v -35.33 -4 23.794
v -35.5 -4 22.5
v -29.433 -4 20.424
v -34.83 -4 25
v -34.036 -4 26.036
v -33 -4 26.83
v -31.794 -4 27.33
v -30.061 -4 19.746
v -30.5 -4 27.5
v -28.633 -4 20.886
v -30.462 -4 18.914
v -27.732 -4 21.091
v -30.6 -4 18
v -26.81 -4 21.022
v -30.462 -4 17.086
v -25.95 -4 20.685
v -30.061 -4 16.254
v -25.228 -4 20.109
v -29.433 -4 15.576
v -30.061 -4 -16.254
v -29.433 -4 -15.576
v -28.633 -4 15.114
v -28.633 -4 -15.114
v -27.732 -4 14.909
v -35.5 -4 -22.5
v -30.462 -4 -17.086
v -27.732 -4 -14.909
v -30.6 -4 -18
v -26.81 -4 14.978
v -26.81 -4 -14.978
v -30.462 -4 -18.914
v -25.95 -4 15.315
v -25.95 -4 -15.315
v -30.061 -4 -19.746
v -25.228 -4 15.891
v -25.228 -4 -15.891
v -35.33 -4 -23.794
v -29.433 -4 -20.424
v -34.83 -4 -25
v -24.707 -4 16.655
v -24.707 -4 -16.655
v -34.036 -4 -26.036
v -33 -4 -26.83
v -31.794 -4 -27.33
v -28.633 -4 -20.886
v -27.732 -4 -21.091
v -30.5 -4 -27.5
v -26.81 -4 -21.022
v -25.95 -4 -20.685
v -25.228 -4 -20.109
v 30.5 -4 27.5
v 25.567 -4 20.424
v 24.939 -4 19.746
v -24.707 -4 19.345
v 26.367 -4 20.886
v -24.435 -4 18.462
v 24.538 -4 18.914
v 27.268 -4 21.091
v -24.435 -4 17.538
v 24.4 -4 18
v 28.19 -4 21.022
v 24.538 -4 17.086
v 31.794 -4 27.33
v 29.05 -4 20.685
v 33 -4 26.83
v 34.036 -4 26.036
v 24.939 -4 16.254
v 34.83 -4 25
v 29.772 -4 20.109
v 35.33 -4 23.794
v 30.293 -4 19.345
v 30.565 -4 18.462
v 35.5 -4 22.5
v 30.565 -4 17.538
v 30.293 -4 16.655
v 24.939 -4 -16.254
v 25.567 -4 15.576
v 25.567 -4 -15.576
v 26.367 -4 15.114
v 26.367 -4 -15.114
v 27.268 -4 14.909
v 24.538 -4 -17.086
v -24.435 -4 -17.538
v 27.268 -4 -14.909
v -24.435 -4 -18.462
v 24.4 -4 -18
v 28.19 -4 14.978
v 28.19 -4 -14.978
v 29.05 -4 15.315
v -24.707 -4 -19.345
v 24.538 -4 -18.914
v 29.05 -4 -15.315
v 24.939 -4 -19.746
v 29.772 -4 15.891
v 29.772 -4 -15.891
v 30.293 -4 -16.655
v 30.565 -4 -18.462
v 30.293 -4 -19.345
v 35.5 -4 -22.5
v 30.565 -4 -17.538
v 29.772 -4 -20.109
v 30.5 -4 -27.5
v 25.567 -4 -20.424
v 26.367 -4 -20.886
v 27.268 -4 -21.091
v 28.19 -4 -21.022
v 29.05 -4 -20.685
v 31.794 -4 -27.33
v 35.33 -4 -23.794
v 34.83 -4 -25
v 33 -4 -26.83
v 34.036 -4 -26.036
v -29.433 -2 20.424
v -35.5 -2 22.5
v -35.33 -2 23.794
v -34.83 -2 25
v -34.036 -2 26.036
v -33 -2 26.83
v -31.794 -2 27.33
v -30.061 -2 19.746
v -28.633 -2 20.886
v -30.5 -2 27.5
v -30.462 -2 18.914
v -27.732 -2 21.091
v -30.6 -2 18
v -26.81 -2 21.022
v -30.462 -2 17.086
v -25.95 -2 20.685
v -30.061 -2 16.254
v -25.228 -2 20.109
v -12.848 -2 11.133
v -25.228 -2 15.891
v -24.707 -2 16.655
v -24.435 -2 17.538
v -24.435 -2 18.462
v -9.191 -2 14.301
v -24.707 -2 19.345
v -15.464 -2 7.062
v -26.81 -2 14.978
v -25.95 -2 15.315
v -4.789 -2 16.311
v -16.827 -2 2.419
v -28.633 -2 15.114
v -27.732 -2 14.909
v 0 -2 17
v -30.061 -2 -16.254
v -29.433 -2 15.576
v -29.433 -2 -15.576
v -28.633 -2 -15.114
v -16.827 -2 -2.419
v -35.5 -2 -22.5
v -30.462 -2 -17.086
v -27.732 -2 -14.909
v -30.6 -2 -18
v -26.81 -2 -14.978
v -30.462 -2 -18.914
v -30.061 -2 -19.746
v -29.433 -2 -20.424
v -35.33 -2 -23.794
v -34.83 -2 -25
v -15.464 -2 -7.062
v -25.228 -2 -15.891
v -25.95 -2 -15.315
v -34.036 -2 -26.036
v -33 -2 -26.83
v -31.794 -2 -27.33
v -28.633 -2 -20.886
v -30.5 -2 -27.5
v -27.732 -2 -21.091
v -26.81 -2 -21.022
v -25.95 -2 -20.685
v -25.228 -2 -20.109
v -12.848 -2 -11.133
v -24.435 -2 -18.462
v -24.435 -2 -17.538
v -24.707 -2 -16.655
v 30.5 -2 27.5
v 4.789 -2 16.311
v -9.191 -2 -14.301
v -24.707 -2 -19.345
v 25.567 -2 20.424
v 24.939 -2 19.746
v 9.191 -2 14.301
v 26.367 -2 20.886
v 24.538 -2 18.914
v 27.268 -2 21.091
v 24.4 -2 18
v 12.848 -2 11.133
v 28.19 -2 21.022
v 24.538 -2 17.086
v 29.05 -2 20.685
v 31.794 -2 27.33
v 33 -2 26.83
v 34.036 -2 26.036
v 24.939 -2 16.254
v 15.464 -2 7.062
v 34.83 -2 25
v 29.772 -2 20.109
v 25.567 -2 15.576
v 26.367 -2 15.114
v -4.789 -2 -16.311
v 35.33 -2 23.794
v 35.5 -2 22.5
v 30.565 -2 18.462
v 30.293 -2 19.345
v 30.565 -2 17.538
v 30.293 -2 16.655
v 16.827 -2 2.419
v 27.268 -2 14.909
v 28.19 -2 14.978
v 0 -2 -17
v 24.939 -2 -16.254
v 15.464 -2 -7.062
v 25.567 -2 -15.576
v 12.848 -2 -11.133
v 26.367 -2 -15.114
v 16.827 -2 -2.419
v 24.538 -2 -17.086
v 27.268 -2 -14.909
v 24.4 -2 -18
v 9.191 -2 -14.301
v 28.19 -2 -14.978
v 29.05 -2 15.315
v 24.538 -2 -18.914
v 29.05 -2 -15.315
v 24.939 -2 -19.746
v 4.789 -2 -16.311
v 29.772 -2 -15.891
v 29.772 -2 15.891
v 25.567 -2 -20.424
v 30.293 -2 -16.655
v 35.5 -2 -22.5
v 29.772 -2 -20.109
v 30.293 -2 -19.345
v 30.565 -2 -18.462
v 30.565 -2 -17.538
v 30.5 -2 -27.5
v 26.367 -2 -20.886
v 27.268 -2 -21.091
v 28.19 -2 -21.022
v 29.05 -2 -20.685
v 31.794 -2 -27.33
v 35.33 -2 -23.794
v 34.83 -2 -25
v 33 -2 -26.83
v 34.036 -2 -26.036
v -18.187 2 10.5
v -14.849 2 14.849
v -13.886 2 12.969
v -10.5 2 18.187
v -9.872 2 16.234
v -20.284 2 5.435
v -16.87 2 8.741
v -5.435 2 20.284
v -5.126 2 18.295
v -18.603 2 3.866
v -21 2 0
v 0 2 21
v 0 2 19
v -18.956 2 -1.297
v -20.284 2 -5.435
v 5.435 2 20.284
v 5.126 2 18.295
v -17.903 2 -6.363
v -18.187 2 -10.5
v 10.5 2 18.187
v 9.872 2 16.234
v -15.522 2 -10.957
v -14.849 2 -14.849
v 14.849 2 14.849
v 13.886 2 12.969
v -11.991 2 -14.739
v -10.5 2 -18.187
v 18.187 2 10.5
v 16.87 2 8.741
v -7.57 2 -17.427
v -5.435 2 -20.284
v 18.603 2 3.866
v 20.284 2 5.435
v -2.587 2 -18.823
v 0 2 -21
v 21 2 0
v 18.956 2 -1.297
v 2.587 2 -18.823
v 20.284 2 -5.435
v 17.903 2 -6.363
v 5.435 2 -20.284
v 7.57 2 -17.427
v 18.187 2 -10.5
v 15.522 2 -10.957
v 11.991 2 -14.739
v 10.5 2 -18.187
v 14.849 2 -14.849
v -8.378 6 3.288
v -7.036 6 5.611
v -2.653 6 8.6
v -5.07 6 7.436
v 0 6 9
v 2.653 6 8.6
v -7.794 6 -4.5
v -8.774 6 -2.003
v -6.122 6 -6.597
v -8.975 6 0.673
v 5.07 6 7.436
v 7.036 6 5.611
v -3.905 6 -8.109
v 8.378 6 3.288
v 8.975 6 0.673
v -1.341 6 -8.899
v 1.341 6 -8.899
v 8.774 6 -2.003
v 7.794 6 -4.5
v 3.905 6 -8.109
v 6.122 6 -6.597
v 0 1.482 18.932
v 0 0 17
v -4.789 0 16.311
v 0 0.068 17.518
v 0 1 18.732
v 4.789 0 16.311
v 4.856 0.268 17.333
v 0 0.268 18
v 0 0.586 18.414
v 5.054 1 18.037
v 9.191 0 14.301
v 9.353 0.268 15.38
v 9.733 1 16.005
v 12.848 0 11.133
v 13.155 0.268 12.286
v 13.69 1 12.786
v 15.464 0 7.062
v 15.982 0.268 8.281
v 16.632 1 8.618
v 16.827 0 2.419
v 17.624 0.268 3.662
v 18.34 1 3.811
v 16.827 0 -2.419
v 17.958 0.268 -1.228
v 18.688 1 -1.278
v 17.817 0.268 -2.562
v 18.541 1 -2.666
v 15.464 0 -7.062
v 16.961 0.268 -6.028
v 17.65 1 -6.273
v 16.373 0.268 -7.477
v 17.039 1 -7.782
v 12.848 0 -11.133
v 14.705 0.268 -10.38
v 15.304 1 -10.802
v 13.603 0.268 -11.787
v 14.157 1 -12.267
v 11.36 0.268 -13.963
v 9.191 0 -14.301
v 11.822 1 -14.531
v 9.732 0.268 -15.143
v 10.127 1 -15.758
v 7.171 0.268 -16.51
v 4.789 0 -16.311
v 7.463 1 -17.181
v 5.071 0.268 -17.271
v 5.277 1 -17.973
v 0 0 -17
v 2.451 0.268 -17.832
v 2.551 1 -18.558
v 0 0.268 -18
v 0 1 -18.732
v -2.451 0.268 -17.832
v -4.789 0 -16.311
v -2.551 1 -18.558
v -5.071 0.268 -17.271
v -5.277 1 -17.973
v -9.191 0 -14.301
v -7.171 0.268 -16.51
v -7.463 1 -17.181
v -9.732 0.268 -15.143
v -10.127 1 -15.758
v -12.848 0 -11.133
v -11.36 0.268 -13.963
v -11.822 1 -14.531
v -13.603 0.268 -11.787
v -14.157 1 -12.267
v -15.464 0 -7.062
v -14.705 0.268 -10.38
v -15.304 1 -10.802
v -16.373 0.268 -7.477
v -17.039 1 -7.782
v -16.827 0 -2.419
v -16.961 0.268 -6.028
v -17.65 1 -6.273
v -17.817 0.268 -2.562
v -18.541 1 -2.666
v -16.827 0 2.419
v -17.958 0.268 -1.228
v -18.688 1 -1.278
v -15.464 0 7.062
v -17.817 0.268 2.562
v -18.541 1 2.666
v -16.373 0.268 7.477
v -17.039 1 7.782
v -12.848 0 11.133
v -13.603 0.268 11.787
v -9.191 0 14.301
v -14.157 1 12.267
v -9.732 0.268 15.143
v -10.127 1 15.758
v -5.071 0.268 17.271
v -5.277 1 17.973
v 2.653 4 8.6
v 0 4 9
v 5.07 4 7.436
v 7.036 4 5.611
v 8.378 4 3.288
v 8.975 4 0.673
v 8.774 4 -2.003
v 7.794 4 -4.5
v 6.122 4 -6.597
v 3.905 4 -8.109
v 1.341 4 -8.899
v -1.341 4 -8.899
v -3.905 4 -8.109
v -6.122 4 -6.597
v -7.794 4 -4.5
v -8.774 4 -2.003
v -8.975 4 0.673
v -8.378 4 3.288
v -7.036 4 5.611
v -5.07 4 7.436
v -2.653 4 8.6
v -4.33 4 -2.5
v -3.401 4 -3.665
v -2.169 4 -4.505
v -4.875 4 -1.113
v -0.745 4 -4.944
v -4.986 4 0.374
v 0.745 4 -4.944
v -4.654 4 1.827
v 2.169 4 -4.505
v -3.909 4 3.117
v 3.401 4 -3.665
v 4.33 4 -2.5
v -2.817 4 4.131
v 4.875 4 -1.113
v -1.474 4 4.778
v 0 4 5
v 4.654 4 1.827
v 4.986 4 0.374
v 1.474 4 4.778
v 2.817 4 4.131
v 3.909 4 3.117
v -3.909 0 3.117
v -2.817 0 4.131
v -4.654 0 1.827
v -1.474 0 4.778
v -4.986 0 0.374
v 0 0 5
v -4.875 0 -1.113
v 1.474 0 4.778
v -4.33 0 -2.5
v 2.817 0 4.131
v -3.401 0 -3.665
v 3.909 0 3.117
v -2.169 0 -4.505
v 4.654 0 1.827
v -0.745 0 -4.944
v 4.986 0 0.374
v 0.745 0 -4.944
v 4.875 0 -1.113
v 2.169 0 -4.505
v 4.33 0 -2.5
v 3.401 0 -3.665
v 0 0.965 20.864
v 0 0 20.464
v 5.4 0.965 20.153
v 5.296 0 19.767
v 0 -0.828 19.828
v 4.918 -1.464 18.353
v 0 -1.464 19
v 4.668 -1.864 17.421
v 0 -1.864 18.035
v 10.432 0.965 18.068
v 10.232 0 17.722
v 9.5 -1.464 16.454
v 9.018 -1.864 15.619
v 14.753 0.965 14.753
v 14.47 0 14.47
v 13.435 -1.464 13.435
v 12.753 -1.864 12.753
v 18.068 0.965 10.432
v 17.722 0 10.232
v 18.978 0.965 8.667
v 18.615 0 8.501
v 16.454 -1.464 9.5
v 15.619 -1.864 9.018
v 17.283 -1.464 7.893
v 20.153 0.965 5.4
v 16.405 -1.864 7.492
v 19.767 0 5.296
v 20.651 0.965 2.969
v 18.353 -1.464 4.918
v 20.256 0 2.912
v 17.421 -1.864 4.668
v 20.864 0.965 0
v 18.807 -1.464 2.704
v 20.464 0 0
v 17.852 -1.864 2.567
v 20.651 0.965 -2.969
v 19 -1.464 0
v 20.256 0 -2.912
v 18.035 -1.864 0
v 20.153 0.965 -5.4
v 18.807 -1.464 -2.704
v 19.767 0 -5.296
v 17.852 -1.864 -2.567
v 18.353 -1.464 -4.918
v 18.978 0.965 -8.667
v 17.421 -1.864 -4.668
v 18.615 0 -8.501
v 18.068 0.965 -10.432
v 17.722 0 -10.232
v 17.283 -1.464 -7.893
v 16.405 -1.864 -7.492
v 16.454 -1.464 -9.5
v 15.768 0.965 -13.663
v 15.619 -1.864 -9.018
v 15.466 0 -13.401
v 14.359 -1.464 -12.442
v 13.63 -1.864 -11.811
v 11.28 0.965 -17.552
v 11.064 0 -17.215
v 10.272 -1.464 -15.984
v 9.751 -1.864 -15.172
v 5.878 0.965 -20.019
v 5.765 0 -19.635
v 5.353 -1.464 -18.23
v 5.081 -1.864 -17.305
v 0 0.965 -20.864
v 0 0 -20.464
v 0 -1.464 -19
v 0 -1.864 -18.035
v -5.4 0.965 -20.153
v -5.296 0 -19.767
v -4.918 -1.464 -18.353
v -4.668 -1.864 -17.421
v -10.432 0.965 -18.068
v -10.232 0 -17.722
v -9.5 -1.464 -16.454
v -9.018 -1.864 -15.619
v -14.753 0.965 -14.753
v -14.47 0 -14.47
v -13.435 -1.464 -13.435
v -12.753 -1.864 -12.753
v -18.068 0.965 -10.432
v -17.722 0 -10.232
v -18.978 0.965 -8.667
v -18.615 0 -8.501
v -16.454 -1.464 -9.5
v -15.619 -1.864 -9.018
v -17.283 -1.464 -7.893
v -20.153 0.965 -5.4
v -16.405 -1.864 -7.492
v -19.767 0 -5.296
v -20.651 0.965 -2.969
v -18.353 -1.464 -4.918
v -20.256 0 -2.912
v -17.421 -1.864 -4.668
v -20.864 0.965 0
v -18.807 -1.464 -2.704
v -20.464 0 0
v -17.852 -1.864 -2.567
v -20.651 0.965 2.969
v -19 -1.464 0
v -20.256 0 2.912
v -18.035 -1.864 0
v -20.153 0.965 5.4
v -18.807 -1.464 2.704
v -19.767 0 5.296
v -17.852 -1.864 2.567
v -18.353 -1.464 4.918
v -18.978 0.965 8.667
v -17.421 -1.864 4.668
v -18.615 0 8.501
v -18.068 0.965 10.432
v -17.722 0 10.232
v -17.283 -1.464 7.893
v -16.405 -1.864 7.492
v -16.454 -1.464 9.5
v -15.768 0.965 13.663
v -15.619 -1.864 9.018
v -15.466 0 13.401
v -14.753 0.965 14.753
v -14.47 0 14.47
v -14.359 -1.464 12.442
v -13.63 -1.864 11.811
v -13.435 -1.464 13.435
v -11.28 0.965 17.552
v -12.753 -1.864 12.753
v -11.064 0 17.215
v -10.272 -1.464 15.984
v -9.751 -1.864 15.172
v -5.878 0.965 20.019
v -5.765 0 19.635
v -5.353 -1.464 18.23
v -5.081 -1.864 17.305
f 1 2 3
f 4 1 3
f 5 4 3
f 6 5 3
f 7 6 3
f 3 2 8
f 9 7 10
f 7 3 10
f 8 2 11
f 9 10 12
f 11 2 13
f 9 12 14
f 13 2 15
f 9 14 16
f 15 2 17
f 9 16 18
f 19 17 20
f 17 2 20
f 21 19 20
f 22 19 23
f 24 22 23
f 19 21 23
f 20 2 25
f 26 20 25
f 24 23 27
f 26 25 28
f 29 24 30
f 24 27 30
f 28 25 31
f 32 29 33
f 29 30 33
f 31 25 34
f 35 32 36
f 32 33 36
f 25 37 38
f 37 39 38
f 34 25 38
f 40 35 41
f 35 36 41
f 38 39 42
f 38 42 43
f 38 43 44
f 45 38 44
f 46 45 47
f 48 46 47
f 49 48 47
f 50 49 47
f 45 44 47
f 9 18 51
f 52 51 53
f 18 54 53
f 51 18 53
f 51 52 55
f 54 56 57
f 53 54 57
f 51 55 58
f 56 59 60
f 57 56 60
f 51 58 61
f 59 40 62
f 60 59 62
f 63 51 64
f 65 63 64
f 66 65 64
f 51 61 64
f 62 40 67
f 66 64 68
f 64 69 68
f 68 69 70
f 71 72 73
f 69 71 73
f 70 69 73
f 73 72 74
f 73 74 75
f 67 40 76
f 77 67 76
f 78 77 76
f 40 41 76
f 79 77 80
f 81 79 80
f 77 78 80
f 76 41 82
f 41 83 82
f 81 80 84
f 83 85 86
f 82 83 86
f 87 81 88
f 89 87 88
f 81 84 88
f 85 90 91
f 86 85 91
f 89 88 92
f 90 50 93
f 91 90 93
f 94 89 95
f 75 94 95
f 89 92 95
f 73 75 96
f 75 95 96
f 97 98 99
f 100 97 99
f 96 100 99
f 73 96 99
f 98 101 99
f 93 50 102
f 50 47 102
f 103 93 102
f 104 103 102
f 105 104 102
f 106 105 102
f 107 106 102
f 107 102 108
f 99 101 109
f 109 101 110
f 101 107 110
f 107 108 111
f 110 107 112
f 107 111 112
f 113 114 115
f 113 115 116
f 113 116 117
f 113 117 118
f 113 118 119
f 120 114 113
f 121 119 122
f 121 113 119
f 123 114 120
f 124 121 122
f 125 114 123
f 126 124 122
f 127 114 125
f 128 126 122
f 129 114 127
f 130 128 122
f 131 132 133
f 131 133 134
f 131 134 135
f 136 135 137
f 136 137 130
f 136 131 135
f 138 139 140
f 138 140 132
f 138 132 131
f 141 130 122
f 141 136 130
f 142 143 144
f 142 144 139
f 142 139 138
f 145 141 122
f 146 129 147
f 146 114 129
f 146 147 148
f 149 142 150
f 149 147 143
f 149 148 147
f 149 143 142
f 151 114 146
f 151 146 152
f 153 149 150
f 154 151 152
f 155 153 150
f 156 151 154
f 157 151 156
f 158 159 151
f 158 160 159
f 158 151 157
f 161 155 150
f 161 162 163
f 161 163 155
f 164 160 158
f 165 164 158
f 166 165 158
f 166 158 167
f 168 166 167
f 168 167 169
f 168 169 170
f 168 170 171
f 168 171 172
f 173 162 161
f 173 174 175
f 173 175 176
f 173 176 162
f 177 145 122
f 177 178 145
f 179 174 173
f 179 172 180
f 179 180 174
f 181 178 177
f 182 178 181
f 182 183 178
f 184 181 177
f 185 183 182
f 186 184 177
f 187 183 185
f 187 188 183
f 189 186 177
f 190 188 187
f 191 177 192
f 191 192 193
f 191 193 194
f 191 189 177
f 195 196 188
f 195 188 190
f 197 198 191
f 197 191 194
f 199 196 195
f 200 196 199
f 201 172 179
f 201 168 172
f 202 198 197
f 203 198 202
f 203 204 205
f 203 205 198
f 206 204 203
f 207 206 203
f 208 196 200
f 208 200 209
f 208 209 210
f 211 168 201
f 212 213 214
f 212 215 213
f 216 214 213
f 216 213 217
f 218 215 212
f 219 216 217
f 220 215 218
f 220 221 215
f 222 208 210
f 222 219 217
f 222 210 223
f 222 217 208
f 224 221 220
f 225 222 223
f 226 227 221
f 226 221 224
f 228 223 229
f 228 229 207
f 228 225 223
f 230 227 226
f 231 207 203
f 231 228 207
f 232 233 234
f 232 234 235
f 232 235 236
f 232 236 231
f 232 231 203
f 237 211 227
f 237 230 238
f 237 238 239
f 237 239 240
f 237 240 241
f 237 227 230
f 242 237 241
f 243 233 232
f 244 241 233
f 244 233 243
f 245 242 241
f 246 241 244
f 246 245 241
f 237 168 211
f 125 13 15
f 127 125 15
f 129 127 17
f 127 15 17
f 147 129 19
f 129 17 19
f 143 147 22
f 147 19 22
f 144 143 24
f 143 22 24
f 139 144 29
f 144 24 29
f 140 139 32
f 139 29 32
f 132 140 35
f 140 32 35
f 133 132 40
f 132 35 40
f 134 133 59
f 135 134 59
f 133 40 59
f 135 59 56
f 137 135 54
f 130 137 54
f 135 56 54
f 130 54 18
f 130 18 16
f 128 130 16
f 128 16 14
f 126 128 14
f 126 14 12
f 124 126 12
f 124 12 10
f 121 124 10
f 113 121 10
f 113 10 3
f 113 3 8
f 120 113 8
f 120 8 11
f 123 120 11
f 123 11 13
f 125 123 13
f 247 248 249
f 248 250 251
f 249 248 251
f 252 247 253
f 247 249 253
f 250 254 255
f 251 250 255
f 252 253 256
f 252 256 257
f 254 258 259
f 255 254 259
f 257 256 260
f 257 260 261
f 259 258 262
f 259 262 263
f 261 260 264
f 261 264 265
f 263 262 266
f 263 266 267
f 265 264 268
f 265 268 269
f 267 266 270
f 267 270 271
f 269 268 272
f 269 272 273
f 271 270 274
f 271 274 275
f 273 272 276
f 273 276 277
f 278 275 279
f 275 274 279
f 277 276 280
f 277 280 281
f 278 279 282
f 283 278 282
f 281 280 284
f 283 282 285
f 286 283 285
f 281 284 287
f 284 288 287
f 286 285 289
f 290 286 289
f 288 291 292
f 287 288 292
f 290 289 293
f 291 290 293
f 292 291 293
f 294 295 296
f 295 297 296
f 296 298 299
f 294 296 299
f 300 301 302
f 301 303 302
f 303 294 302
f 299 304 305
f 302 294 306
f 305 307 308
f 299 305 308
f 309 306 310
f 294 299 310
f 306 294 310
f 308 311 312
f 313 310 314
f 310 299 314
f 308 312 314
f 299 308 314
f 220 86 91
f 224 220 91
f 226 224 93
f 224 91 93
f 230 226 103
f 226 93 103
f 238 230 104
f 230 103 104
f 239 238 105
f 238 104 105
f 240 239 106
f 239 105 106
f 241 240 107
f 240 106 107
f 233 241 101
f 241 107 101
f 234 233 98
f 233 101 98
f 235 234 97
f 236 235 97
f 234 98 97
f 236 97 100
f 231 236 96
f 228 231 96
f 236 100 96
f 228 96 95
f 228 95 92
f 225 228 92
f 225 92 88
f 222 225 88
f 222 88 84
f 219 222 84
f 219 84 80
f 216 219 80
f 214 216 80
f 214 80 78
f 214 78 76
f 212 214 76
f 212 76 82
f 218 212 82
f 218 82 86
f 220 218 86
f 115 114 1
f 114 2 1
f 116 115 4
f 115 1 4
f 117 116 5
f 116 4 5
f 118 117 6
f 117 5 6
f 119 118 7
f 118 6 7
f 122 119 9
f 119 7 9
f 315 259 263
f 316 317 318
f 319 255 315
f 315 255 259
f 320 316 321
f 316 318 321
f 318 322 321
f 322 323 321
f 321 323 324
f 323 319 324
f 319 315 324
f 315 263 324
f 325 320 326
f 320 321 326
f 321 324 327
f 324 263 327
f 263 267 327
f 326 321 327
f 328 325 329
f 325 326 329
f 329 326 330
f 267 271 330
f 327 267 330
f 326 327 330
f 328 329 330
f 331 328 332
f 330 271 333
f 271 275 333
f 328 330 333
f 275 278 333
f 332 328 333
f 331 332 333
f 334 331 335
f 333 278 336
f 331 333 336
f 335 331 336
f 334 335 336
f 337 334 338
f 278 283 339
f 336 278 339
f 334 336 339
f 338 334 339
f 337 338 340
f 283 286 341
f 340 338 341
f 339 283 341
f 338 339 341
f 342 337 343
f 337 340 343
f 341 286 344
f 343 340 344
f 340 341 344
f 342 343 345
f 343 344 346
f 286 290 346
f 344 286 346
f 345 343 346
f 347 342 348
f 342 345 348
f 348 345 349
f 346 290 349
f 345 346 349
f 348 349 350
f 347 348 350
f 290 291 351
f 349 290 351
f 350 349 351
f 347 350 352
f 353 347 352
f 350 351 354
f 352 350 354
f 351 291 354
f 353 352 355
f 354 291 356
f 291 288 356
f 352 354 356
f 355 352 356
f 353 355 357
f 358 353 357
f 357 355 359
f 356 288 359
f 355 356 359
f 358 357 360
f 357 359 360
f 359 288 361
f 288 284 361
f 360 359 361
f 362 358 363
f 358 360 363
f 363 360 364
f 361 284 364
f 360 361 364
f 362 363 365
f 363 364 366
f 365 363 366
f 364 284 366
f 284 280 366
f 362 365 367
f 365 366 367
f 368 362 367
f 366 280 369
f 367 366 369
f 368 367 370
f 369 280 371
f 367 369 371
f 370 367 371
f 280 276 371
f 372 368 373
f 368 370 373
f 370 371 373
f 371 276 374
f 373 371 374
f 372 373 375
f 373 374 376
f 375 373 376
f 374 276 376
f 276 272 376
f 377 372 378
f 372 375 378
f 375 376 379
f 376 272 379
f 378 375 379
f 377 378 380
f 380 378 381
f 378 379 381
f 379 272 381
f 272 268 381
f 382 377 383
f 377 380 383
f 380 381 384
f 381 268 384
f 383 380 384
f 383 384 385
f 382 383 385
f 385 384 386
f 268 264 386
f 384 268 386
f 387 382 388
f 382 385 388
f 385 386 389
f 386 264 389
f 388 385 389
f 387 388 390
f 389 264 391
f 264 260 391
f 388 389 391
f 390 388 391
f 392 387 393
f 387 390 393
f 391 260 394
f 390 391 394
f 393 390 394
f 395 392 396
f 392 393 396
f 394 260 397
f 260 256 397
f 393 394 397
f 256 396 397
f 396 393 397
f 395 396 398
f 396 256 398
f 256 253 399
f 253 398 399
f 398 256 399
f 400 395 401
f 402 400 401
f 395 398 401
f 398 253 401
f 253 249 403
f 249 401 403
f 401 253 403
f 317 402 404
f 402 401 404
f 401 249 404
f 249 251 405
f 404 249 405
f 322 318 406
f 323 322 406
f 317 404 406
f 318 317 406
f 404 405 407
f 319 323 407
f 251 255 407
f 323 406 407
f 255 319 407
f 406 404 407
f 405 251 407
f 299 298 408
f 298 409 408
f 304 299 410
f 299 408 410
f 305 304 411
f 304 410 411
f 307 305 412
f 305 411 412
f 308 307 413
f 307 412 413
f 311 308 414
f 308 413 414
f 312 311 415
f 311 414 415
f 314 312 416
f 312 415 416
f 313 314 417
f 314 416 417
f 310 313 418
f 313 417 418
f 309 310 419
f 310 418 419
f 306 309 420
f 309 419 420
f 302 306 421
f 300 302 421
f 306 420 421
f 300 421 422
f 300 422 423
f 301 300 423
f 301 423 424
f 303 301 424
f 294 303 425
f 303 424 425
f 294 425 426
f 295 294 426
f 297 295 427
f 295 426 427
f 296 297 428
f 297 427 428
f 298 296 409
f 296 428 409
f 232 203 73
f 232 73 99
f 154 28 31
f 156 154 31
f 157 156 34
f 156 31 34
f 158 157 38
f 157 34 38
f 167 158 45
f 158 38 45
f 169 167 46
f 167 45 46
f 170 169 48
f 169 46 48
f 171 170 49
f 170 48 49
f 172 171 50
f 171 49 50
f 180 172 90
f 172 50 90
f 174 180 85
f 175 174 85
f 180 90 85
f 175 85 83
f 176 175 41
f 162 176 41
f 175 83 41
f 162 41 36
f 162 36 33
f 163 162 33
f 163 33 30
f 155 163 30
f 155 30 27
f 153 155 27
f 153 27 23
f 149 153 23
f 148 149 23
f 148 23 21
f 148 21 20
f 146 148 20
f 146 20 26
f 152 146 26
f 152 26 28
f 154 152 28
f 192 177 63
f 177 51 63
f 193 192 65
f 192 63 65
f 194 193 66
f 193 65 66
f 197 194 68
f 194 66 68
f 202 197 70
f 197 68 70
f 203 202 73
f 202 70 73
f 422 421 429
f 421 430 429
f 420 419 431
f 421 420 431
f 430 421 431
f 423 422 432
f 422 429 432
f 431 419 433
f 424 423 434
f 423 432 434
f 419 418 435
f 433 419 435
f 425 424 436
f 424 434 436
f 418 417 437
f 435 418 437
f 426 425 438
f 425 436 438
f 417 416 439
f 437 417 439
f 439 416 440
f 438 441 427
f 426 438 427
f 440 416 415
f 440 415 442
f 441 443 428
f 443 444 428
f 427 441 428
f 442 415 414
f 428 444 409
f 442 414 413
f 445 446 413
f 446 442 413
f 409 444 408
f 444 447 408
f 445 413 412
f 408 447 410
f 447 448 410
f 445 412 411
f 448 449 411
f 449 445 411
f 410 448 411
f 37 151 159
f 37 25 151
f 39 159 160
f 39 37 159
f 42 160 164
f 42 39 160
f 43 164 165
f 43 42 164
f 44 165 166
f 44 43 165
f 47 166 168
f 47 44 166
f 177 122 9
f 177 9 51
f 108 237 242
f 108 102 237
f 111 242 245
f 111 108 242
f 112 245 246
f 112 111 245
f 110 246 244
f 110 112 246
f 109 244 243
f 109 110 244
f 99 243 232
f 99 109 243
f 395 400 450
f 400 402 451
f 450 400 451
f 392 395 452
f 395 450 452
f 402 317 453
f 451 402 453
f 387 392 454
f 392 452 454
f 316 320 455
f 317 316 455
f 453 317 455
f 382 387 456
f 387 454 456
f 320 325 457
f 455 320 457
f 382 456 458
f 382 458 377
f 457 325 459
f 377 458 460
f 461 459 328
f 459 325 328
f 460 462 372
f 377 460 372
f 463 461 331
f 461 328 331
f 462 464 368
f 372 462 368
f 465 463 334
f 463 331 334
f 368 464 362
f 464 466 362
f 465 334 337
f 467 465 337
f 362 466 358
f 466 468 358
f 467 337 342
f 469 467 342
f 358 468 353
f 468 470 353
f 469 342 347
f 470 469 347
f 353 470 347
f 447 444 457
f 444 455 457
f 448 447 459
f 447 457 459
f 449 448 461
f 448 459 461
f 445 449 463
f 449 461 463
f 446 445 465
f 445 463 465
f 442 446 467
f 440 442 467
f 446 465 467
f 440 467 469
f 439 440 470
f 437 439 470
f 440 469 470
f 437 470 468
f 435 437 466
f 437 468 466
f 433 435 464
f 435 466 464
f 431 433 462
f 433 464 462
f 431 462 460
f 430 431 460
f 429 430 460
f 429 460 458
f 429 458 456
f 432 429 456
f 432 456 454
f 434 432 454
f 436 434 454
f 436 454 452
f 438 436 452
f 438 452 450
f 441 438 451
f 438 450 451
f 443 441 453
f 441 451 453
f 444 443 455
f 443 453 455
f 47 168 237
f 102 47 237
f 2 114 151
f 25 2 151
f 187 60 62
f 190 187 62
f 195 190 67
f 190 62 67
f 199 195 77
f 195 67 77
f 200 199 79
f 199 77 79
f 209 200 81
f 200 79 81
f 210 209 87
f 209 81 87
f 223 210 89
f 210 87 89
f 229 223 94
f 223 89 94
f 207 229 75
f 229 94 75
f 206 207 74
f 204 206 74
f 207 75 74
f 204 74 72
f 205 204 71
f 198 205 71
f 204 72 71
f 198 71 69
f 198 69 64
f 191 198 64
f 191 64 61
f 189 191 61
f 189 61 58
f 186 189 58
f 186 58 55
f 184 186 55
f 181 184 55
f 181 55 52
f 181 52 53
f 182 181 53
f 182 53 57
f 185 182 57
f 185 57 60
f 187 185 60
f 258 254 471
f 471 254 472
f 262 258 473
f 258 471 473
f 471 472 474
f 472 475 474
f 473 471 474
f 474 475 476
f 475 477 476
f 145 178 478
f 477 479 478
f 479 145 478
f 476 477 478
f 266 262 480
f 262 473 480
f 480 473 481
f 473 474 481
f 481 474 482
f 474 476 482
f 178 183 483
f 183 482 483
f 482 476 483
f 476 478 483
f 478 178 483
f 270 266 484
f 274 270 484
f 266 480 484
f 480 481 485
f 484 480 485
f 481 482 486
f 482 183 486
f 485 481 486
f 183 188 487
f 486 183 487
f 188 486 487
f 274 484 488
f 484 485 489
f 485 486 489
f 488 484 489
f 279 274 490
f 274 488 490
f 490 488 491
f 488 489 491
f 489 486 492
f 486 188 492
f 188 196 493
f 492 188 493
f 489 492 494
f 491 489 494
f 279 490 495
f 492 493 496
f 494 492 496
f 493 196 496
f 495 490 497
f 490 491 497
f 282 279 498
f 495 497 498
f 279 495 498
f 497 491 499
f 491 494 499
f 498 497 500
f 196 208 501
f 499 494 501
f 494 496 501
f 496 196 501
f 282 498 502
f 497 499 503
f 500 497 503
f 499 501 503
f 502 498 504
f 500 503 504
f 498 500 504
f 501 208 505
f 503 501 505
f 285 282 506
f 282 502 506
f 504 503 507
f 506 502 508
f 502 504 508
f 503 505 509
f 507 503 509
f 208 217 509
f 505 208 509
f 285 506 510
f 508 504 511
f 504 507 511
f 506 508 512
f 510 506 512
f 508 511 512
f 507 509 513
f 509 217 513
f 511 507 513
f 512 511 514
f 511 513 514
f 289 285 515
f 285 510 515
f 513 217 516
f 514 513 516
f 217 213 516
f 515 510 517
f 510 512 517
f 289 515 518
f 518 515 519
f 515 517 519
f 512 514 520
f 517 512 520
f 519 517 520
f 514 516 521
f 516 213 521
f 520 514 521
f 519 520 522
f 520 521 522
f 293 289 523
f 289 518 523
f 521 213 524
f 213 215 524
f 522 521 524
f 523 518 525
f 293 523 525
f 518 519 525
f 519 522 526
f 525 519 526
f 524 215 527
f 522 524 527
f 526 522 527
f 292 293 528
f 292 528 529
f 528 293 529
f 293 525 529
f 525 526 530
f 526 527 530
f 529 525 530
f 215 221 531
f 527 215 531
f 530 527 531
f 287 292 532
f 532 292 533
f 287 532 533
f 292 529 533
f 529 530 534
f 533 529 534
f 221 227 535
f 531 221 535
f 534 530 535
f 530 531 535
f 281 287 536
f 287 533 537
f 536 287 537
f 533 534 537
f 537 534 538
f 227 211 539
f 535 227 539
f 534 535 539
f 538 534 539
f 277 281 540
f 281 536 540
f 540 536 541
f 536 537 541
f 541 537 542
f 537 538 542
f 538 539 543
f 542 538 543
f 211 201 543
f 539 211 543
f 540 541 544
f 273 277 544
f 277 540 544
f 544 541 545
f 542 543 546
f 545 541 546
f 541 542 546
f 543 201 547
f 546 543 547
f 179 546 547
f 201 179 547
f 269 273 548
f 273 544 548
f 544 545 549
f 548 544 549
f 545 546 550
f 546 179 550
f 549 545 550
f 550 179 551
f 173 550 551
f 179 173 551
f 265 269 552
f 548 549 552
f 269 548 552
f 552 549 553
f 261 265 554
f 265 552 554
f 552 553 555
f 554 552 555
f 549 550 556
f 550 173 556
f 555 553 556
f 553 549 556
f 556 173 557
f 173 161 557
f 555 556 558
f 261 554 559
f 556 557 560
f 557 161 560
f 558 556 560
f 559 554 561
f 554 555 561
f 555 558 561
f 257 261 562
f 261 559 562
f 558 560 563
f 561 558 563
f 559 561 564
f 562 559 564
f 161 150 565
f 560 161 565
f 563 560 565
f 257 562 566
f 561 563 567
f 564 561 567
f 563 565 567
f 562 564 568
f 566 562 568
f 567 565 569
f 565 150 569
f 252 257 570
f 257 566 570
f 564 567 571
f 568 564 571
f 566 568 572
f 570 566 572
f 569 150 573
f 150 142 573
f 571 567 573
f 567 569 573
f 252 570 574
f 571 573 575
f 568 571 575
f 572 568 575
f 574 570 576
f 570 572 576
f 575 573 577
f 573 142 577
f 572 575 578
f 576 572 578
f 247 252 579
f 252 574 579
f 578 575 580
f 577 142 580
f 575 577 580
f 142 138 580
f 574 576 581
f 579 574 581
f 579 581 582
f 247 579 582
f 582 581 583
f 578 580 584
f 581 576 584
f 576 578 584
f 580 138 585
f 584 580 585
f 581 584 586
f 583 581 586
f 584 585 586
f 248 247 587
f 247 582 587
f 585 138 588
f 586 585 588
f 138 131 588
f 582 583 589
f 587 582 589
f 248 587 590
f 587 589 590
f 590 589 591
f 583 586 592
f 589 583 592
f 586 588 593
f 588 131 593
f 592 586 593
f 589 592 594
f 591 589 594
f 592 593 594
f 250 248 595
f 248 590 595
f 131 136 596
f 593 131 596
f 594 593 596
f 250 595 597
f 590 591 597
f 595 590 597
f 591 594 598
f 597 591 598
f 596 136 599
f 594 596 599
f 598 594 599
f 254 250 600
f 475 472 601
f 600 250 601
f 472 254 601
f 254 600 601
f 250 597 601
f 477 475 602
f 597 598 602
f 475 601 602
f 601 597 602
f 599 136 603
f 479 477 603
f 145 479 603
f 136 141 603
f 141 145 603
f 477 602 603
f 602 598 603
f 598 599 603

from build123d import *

# Parameters (mm, degrees)
SKETCH_2_W              = 71
SKETCH_2_H              = 55
EXTRUDE_1_DEPTH         = 2
HOLE_WIZARD_6_2_6_2_1_D = 6.2
FILLET_1_R              = 5


with BuildPart() as part:
    # 草图1 → 旋转1 (revolve)
    with BuildSketch(Plane(origin=(0, 0, 0), x_dir=(-1, 0, 0), z_dir=(0, 0, -1)), mode=Mode.PRIVATE) as revolve_1_sk:
        with BuildLine():
            Line((-17, -2), (0, -2))
            Line((0, -2), (0, 0))
            Line((0, 0), (-17, 0))
            ThreePointArc((-17, 0), (-18.414213562, 0.585786438), (-19, 2))
            Line((-19, 2), (-21, 2))
            ThreePointArc((-21, 2), (-19.828427125, -0.828427125), (-17, -2))
        make_face()
    revolve(revolve_1_sk.sketch.rotate(Axis((0, -2.005, 0), (0, 1, 0)), 270), axis=Axis((0, -2.005, 0), (0, 1, 0)))

    # 草图2 → 凸台-拉伸1 (add)
    with BuildSketch(Plane(origin=(0, -2, 0), x_dir=(1, 0, 0), z_dir=(0, 1, 0))):
        Rectangle(SKETCH_2_W, SKETCH_2_H)
    extrude(amount=-EXTRUDE_1_DEPTH)

    # 草图3 → 旋转2 (revolve)
    with BuildSketch(Plane(origin=(0, 0, 0), x_dir=(-1, 0, 0), z_dir=(0, 0, -1)), mode=Mode.PRIVATE) as revolve_2_sk:
        Polygon((-5, 0), (0, 0), (0, 6), (-9, 6), (-9, 4), (-5, 4), align=None)
    revolve(revolve_2_sk.sketch.rotate(Axis((0, 0, 0), (0, 1, 0)), 270), axis=Axis((0, 0, 0), (0, 1, 0)))

    # Ø6.2 (6.2) 直径孔1 (through all)
    with Locations(Plane(origin=(0, -2, 0), x_dir=(1, 0, 0), z_dir=(0, 1, 0))):
        with Locations((-27.5, 18), (-27.5, -18), (27.5, -18), (27.5, 18)):
            Hole(HOLE_WIZARD_6_2_6_2_1_D / 2)

    # 圆角1
    fillet_1_edges = [part.edges().sort_by_distance(p)[0] for p in [
        (35.5, -3, -27.5),
        (35.5, -3, 27.5),
        (-35.5, -3, 27.5),
        (-35.5, -3, -27.5),
    ]]
    fillet(fillet_1_edges, radius=FILLET_1_R)


solid = part.part
